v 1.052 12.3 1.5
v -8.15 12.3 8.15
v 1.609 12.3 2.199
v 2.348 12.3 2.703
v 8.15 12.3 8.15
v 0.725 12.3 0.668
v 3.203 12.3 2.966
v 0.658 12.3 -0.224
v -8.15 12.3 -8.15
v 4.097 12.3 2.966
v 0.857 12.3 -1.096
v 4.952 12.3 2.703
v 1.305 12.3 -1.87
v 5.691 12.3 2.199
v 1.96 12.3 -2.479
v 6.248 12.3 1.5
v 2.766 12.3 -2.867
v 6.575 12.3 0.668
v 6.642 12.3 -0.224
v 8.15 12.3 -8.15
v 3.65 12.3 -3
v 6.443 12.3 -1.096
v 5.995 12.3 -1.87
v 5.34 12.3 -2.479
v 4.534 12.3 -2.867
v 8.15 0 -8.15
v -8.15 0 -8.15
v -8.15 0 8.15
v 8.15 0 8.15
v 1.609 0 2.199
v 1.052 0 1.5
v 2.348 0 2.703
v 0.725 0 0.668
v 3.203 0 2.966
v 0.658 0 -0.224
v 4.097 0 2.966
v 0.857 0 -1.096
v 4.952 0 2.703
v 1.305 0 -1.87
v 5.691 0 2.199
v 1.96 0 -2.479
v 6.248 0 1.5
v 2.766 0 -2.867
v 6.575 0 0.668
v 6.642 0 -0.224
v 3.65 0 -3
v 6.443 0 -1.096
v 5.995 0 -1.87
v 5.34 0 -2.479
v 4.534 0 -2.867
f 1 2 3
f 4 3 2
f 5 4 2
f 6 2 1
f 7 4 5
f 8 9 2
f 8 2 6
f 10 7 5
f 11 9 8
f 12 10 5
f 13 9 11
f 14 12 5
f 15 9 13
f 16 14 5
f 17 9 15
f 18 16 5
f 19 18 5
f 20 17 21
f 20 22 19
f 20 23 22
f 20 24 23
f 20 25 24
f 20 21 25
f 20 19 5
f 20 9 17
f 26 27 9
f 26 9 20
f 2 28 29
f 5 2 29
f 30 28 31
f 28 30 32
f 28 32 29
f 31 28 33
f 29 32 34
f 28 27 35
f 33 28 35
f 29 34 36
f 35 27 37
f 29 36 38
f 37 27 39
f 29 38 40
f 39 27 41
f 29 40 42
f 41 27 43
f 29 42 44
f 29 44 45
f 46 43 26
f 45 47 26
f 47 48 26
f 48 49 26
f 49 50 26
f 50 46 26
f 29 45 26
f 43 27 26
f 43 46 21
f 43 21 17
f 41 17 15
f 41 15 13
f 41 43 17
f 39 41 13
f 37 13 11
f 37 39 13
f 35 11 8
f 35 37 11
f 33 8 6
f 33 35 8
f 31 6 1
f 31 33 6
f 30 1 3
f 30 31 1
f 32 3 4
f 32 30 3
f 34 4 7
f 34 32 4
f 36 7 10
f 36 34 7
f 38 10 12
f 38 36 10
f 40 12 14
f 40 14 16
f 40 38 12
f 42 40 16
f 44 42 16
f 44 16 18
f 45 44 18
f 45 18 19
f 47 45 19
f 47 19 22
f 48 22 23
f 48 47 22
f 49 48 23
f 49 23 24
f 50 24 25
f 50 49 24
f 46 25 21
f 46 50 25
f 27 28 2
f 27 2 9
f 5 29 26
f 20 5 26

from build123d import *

# Parameters (mm, degrees)
SKETCH1_W           = 16.3
SKETCH1_H           = 16.3
BOSS_EXTRUDE1_DEPTH = 12.3
SKETCH2_R           = 3
CUT_EXTRUDE1_DEPTH  = 12.3


with BuildPart() as part:
    # Sketch1 → Boss-Extrude1 (new body)
    with BuildSketch(Plane(origin=(0, 0, 0), x_dir=(1, 0, 0), z_dir=(0, 1, 0))):
        Rectangle(SKETCH1_W, SKETCH1_H)
    extrude(amount=BOSS_EXTRUDE1_DEPTH)

    # Sketch2 → Cut-Extrude1 (cut)
    with BuildSketch(Plane(origin=(0, 0, 0), x_dir=(1, 0, 0), z_dir=(0, 1, 0))):
        with Locations(Location((3.65, 0, 0), (0, 0, 90))):
            Circle(SKETCH2_R)
    extrude(amount=CUT_EXTRUDE1_DEPTH, mode=Mode.SUBTRACT)


solid = part.part
